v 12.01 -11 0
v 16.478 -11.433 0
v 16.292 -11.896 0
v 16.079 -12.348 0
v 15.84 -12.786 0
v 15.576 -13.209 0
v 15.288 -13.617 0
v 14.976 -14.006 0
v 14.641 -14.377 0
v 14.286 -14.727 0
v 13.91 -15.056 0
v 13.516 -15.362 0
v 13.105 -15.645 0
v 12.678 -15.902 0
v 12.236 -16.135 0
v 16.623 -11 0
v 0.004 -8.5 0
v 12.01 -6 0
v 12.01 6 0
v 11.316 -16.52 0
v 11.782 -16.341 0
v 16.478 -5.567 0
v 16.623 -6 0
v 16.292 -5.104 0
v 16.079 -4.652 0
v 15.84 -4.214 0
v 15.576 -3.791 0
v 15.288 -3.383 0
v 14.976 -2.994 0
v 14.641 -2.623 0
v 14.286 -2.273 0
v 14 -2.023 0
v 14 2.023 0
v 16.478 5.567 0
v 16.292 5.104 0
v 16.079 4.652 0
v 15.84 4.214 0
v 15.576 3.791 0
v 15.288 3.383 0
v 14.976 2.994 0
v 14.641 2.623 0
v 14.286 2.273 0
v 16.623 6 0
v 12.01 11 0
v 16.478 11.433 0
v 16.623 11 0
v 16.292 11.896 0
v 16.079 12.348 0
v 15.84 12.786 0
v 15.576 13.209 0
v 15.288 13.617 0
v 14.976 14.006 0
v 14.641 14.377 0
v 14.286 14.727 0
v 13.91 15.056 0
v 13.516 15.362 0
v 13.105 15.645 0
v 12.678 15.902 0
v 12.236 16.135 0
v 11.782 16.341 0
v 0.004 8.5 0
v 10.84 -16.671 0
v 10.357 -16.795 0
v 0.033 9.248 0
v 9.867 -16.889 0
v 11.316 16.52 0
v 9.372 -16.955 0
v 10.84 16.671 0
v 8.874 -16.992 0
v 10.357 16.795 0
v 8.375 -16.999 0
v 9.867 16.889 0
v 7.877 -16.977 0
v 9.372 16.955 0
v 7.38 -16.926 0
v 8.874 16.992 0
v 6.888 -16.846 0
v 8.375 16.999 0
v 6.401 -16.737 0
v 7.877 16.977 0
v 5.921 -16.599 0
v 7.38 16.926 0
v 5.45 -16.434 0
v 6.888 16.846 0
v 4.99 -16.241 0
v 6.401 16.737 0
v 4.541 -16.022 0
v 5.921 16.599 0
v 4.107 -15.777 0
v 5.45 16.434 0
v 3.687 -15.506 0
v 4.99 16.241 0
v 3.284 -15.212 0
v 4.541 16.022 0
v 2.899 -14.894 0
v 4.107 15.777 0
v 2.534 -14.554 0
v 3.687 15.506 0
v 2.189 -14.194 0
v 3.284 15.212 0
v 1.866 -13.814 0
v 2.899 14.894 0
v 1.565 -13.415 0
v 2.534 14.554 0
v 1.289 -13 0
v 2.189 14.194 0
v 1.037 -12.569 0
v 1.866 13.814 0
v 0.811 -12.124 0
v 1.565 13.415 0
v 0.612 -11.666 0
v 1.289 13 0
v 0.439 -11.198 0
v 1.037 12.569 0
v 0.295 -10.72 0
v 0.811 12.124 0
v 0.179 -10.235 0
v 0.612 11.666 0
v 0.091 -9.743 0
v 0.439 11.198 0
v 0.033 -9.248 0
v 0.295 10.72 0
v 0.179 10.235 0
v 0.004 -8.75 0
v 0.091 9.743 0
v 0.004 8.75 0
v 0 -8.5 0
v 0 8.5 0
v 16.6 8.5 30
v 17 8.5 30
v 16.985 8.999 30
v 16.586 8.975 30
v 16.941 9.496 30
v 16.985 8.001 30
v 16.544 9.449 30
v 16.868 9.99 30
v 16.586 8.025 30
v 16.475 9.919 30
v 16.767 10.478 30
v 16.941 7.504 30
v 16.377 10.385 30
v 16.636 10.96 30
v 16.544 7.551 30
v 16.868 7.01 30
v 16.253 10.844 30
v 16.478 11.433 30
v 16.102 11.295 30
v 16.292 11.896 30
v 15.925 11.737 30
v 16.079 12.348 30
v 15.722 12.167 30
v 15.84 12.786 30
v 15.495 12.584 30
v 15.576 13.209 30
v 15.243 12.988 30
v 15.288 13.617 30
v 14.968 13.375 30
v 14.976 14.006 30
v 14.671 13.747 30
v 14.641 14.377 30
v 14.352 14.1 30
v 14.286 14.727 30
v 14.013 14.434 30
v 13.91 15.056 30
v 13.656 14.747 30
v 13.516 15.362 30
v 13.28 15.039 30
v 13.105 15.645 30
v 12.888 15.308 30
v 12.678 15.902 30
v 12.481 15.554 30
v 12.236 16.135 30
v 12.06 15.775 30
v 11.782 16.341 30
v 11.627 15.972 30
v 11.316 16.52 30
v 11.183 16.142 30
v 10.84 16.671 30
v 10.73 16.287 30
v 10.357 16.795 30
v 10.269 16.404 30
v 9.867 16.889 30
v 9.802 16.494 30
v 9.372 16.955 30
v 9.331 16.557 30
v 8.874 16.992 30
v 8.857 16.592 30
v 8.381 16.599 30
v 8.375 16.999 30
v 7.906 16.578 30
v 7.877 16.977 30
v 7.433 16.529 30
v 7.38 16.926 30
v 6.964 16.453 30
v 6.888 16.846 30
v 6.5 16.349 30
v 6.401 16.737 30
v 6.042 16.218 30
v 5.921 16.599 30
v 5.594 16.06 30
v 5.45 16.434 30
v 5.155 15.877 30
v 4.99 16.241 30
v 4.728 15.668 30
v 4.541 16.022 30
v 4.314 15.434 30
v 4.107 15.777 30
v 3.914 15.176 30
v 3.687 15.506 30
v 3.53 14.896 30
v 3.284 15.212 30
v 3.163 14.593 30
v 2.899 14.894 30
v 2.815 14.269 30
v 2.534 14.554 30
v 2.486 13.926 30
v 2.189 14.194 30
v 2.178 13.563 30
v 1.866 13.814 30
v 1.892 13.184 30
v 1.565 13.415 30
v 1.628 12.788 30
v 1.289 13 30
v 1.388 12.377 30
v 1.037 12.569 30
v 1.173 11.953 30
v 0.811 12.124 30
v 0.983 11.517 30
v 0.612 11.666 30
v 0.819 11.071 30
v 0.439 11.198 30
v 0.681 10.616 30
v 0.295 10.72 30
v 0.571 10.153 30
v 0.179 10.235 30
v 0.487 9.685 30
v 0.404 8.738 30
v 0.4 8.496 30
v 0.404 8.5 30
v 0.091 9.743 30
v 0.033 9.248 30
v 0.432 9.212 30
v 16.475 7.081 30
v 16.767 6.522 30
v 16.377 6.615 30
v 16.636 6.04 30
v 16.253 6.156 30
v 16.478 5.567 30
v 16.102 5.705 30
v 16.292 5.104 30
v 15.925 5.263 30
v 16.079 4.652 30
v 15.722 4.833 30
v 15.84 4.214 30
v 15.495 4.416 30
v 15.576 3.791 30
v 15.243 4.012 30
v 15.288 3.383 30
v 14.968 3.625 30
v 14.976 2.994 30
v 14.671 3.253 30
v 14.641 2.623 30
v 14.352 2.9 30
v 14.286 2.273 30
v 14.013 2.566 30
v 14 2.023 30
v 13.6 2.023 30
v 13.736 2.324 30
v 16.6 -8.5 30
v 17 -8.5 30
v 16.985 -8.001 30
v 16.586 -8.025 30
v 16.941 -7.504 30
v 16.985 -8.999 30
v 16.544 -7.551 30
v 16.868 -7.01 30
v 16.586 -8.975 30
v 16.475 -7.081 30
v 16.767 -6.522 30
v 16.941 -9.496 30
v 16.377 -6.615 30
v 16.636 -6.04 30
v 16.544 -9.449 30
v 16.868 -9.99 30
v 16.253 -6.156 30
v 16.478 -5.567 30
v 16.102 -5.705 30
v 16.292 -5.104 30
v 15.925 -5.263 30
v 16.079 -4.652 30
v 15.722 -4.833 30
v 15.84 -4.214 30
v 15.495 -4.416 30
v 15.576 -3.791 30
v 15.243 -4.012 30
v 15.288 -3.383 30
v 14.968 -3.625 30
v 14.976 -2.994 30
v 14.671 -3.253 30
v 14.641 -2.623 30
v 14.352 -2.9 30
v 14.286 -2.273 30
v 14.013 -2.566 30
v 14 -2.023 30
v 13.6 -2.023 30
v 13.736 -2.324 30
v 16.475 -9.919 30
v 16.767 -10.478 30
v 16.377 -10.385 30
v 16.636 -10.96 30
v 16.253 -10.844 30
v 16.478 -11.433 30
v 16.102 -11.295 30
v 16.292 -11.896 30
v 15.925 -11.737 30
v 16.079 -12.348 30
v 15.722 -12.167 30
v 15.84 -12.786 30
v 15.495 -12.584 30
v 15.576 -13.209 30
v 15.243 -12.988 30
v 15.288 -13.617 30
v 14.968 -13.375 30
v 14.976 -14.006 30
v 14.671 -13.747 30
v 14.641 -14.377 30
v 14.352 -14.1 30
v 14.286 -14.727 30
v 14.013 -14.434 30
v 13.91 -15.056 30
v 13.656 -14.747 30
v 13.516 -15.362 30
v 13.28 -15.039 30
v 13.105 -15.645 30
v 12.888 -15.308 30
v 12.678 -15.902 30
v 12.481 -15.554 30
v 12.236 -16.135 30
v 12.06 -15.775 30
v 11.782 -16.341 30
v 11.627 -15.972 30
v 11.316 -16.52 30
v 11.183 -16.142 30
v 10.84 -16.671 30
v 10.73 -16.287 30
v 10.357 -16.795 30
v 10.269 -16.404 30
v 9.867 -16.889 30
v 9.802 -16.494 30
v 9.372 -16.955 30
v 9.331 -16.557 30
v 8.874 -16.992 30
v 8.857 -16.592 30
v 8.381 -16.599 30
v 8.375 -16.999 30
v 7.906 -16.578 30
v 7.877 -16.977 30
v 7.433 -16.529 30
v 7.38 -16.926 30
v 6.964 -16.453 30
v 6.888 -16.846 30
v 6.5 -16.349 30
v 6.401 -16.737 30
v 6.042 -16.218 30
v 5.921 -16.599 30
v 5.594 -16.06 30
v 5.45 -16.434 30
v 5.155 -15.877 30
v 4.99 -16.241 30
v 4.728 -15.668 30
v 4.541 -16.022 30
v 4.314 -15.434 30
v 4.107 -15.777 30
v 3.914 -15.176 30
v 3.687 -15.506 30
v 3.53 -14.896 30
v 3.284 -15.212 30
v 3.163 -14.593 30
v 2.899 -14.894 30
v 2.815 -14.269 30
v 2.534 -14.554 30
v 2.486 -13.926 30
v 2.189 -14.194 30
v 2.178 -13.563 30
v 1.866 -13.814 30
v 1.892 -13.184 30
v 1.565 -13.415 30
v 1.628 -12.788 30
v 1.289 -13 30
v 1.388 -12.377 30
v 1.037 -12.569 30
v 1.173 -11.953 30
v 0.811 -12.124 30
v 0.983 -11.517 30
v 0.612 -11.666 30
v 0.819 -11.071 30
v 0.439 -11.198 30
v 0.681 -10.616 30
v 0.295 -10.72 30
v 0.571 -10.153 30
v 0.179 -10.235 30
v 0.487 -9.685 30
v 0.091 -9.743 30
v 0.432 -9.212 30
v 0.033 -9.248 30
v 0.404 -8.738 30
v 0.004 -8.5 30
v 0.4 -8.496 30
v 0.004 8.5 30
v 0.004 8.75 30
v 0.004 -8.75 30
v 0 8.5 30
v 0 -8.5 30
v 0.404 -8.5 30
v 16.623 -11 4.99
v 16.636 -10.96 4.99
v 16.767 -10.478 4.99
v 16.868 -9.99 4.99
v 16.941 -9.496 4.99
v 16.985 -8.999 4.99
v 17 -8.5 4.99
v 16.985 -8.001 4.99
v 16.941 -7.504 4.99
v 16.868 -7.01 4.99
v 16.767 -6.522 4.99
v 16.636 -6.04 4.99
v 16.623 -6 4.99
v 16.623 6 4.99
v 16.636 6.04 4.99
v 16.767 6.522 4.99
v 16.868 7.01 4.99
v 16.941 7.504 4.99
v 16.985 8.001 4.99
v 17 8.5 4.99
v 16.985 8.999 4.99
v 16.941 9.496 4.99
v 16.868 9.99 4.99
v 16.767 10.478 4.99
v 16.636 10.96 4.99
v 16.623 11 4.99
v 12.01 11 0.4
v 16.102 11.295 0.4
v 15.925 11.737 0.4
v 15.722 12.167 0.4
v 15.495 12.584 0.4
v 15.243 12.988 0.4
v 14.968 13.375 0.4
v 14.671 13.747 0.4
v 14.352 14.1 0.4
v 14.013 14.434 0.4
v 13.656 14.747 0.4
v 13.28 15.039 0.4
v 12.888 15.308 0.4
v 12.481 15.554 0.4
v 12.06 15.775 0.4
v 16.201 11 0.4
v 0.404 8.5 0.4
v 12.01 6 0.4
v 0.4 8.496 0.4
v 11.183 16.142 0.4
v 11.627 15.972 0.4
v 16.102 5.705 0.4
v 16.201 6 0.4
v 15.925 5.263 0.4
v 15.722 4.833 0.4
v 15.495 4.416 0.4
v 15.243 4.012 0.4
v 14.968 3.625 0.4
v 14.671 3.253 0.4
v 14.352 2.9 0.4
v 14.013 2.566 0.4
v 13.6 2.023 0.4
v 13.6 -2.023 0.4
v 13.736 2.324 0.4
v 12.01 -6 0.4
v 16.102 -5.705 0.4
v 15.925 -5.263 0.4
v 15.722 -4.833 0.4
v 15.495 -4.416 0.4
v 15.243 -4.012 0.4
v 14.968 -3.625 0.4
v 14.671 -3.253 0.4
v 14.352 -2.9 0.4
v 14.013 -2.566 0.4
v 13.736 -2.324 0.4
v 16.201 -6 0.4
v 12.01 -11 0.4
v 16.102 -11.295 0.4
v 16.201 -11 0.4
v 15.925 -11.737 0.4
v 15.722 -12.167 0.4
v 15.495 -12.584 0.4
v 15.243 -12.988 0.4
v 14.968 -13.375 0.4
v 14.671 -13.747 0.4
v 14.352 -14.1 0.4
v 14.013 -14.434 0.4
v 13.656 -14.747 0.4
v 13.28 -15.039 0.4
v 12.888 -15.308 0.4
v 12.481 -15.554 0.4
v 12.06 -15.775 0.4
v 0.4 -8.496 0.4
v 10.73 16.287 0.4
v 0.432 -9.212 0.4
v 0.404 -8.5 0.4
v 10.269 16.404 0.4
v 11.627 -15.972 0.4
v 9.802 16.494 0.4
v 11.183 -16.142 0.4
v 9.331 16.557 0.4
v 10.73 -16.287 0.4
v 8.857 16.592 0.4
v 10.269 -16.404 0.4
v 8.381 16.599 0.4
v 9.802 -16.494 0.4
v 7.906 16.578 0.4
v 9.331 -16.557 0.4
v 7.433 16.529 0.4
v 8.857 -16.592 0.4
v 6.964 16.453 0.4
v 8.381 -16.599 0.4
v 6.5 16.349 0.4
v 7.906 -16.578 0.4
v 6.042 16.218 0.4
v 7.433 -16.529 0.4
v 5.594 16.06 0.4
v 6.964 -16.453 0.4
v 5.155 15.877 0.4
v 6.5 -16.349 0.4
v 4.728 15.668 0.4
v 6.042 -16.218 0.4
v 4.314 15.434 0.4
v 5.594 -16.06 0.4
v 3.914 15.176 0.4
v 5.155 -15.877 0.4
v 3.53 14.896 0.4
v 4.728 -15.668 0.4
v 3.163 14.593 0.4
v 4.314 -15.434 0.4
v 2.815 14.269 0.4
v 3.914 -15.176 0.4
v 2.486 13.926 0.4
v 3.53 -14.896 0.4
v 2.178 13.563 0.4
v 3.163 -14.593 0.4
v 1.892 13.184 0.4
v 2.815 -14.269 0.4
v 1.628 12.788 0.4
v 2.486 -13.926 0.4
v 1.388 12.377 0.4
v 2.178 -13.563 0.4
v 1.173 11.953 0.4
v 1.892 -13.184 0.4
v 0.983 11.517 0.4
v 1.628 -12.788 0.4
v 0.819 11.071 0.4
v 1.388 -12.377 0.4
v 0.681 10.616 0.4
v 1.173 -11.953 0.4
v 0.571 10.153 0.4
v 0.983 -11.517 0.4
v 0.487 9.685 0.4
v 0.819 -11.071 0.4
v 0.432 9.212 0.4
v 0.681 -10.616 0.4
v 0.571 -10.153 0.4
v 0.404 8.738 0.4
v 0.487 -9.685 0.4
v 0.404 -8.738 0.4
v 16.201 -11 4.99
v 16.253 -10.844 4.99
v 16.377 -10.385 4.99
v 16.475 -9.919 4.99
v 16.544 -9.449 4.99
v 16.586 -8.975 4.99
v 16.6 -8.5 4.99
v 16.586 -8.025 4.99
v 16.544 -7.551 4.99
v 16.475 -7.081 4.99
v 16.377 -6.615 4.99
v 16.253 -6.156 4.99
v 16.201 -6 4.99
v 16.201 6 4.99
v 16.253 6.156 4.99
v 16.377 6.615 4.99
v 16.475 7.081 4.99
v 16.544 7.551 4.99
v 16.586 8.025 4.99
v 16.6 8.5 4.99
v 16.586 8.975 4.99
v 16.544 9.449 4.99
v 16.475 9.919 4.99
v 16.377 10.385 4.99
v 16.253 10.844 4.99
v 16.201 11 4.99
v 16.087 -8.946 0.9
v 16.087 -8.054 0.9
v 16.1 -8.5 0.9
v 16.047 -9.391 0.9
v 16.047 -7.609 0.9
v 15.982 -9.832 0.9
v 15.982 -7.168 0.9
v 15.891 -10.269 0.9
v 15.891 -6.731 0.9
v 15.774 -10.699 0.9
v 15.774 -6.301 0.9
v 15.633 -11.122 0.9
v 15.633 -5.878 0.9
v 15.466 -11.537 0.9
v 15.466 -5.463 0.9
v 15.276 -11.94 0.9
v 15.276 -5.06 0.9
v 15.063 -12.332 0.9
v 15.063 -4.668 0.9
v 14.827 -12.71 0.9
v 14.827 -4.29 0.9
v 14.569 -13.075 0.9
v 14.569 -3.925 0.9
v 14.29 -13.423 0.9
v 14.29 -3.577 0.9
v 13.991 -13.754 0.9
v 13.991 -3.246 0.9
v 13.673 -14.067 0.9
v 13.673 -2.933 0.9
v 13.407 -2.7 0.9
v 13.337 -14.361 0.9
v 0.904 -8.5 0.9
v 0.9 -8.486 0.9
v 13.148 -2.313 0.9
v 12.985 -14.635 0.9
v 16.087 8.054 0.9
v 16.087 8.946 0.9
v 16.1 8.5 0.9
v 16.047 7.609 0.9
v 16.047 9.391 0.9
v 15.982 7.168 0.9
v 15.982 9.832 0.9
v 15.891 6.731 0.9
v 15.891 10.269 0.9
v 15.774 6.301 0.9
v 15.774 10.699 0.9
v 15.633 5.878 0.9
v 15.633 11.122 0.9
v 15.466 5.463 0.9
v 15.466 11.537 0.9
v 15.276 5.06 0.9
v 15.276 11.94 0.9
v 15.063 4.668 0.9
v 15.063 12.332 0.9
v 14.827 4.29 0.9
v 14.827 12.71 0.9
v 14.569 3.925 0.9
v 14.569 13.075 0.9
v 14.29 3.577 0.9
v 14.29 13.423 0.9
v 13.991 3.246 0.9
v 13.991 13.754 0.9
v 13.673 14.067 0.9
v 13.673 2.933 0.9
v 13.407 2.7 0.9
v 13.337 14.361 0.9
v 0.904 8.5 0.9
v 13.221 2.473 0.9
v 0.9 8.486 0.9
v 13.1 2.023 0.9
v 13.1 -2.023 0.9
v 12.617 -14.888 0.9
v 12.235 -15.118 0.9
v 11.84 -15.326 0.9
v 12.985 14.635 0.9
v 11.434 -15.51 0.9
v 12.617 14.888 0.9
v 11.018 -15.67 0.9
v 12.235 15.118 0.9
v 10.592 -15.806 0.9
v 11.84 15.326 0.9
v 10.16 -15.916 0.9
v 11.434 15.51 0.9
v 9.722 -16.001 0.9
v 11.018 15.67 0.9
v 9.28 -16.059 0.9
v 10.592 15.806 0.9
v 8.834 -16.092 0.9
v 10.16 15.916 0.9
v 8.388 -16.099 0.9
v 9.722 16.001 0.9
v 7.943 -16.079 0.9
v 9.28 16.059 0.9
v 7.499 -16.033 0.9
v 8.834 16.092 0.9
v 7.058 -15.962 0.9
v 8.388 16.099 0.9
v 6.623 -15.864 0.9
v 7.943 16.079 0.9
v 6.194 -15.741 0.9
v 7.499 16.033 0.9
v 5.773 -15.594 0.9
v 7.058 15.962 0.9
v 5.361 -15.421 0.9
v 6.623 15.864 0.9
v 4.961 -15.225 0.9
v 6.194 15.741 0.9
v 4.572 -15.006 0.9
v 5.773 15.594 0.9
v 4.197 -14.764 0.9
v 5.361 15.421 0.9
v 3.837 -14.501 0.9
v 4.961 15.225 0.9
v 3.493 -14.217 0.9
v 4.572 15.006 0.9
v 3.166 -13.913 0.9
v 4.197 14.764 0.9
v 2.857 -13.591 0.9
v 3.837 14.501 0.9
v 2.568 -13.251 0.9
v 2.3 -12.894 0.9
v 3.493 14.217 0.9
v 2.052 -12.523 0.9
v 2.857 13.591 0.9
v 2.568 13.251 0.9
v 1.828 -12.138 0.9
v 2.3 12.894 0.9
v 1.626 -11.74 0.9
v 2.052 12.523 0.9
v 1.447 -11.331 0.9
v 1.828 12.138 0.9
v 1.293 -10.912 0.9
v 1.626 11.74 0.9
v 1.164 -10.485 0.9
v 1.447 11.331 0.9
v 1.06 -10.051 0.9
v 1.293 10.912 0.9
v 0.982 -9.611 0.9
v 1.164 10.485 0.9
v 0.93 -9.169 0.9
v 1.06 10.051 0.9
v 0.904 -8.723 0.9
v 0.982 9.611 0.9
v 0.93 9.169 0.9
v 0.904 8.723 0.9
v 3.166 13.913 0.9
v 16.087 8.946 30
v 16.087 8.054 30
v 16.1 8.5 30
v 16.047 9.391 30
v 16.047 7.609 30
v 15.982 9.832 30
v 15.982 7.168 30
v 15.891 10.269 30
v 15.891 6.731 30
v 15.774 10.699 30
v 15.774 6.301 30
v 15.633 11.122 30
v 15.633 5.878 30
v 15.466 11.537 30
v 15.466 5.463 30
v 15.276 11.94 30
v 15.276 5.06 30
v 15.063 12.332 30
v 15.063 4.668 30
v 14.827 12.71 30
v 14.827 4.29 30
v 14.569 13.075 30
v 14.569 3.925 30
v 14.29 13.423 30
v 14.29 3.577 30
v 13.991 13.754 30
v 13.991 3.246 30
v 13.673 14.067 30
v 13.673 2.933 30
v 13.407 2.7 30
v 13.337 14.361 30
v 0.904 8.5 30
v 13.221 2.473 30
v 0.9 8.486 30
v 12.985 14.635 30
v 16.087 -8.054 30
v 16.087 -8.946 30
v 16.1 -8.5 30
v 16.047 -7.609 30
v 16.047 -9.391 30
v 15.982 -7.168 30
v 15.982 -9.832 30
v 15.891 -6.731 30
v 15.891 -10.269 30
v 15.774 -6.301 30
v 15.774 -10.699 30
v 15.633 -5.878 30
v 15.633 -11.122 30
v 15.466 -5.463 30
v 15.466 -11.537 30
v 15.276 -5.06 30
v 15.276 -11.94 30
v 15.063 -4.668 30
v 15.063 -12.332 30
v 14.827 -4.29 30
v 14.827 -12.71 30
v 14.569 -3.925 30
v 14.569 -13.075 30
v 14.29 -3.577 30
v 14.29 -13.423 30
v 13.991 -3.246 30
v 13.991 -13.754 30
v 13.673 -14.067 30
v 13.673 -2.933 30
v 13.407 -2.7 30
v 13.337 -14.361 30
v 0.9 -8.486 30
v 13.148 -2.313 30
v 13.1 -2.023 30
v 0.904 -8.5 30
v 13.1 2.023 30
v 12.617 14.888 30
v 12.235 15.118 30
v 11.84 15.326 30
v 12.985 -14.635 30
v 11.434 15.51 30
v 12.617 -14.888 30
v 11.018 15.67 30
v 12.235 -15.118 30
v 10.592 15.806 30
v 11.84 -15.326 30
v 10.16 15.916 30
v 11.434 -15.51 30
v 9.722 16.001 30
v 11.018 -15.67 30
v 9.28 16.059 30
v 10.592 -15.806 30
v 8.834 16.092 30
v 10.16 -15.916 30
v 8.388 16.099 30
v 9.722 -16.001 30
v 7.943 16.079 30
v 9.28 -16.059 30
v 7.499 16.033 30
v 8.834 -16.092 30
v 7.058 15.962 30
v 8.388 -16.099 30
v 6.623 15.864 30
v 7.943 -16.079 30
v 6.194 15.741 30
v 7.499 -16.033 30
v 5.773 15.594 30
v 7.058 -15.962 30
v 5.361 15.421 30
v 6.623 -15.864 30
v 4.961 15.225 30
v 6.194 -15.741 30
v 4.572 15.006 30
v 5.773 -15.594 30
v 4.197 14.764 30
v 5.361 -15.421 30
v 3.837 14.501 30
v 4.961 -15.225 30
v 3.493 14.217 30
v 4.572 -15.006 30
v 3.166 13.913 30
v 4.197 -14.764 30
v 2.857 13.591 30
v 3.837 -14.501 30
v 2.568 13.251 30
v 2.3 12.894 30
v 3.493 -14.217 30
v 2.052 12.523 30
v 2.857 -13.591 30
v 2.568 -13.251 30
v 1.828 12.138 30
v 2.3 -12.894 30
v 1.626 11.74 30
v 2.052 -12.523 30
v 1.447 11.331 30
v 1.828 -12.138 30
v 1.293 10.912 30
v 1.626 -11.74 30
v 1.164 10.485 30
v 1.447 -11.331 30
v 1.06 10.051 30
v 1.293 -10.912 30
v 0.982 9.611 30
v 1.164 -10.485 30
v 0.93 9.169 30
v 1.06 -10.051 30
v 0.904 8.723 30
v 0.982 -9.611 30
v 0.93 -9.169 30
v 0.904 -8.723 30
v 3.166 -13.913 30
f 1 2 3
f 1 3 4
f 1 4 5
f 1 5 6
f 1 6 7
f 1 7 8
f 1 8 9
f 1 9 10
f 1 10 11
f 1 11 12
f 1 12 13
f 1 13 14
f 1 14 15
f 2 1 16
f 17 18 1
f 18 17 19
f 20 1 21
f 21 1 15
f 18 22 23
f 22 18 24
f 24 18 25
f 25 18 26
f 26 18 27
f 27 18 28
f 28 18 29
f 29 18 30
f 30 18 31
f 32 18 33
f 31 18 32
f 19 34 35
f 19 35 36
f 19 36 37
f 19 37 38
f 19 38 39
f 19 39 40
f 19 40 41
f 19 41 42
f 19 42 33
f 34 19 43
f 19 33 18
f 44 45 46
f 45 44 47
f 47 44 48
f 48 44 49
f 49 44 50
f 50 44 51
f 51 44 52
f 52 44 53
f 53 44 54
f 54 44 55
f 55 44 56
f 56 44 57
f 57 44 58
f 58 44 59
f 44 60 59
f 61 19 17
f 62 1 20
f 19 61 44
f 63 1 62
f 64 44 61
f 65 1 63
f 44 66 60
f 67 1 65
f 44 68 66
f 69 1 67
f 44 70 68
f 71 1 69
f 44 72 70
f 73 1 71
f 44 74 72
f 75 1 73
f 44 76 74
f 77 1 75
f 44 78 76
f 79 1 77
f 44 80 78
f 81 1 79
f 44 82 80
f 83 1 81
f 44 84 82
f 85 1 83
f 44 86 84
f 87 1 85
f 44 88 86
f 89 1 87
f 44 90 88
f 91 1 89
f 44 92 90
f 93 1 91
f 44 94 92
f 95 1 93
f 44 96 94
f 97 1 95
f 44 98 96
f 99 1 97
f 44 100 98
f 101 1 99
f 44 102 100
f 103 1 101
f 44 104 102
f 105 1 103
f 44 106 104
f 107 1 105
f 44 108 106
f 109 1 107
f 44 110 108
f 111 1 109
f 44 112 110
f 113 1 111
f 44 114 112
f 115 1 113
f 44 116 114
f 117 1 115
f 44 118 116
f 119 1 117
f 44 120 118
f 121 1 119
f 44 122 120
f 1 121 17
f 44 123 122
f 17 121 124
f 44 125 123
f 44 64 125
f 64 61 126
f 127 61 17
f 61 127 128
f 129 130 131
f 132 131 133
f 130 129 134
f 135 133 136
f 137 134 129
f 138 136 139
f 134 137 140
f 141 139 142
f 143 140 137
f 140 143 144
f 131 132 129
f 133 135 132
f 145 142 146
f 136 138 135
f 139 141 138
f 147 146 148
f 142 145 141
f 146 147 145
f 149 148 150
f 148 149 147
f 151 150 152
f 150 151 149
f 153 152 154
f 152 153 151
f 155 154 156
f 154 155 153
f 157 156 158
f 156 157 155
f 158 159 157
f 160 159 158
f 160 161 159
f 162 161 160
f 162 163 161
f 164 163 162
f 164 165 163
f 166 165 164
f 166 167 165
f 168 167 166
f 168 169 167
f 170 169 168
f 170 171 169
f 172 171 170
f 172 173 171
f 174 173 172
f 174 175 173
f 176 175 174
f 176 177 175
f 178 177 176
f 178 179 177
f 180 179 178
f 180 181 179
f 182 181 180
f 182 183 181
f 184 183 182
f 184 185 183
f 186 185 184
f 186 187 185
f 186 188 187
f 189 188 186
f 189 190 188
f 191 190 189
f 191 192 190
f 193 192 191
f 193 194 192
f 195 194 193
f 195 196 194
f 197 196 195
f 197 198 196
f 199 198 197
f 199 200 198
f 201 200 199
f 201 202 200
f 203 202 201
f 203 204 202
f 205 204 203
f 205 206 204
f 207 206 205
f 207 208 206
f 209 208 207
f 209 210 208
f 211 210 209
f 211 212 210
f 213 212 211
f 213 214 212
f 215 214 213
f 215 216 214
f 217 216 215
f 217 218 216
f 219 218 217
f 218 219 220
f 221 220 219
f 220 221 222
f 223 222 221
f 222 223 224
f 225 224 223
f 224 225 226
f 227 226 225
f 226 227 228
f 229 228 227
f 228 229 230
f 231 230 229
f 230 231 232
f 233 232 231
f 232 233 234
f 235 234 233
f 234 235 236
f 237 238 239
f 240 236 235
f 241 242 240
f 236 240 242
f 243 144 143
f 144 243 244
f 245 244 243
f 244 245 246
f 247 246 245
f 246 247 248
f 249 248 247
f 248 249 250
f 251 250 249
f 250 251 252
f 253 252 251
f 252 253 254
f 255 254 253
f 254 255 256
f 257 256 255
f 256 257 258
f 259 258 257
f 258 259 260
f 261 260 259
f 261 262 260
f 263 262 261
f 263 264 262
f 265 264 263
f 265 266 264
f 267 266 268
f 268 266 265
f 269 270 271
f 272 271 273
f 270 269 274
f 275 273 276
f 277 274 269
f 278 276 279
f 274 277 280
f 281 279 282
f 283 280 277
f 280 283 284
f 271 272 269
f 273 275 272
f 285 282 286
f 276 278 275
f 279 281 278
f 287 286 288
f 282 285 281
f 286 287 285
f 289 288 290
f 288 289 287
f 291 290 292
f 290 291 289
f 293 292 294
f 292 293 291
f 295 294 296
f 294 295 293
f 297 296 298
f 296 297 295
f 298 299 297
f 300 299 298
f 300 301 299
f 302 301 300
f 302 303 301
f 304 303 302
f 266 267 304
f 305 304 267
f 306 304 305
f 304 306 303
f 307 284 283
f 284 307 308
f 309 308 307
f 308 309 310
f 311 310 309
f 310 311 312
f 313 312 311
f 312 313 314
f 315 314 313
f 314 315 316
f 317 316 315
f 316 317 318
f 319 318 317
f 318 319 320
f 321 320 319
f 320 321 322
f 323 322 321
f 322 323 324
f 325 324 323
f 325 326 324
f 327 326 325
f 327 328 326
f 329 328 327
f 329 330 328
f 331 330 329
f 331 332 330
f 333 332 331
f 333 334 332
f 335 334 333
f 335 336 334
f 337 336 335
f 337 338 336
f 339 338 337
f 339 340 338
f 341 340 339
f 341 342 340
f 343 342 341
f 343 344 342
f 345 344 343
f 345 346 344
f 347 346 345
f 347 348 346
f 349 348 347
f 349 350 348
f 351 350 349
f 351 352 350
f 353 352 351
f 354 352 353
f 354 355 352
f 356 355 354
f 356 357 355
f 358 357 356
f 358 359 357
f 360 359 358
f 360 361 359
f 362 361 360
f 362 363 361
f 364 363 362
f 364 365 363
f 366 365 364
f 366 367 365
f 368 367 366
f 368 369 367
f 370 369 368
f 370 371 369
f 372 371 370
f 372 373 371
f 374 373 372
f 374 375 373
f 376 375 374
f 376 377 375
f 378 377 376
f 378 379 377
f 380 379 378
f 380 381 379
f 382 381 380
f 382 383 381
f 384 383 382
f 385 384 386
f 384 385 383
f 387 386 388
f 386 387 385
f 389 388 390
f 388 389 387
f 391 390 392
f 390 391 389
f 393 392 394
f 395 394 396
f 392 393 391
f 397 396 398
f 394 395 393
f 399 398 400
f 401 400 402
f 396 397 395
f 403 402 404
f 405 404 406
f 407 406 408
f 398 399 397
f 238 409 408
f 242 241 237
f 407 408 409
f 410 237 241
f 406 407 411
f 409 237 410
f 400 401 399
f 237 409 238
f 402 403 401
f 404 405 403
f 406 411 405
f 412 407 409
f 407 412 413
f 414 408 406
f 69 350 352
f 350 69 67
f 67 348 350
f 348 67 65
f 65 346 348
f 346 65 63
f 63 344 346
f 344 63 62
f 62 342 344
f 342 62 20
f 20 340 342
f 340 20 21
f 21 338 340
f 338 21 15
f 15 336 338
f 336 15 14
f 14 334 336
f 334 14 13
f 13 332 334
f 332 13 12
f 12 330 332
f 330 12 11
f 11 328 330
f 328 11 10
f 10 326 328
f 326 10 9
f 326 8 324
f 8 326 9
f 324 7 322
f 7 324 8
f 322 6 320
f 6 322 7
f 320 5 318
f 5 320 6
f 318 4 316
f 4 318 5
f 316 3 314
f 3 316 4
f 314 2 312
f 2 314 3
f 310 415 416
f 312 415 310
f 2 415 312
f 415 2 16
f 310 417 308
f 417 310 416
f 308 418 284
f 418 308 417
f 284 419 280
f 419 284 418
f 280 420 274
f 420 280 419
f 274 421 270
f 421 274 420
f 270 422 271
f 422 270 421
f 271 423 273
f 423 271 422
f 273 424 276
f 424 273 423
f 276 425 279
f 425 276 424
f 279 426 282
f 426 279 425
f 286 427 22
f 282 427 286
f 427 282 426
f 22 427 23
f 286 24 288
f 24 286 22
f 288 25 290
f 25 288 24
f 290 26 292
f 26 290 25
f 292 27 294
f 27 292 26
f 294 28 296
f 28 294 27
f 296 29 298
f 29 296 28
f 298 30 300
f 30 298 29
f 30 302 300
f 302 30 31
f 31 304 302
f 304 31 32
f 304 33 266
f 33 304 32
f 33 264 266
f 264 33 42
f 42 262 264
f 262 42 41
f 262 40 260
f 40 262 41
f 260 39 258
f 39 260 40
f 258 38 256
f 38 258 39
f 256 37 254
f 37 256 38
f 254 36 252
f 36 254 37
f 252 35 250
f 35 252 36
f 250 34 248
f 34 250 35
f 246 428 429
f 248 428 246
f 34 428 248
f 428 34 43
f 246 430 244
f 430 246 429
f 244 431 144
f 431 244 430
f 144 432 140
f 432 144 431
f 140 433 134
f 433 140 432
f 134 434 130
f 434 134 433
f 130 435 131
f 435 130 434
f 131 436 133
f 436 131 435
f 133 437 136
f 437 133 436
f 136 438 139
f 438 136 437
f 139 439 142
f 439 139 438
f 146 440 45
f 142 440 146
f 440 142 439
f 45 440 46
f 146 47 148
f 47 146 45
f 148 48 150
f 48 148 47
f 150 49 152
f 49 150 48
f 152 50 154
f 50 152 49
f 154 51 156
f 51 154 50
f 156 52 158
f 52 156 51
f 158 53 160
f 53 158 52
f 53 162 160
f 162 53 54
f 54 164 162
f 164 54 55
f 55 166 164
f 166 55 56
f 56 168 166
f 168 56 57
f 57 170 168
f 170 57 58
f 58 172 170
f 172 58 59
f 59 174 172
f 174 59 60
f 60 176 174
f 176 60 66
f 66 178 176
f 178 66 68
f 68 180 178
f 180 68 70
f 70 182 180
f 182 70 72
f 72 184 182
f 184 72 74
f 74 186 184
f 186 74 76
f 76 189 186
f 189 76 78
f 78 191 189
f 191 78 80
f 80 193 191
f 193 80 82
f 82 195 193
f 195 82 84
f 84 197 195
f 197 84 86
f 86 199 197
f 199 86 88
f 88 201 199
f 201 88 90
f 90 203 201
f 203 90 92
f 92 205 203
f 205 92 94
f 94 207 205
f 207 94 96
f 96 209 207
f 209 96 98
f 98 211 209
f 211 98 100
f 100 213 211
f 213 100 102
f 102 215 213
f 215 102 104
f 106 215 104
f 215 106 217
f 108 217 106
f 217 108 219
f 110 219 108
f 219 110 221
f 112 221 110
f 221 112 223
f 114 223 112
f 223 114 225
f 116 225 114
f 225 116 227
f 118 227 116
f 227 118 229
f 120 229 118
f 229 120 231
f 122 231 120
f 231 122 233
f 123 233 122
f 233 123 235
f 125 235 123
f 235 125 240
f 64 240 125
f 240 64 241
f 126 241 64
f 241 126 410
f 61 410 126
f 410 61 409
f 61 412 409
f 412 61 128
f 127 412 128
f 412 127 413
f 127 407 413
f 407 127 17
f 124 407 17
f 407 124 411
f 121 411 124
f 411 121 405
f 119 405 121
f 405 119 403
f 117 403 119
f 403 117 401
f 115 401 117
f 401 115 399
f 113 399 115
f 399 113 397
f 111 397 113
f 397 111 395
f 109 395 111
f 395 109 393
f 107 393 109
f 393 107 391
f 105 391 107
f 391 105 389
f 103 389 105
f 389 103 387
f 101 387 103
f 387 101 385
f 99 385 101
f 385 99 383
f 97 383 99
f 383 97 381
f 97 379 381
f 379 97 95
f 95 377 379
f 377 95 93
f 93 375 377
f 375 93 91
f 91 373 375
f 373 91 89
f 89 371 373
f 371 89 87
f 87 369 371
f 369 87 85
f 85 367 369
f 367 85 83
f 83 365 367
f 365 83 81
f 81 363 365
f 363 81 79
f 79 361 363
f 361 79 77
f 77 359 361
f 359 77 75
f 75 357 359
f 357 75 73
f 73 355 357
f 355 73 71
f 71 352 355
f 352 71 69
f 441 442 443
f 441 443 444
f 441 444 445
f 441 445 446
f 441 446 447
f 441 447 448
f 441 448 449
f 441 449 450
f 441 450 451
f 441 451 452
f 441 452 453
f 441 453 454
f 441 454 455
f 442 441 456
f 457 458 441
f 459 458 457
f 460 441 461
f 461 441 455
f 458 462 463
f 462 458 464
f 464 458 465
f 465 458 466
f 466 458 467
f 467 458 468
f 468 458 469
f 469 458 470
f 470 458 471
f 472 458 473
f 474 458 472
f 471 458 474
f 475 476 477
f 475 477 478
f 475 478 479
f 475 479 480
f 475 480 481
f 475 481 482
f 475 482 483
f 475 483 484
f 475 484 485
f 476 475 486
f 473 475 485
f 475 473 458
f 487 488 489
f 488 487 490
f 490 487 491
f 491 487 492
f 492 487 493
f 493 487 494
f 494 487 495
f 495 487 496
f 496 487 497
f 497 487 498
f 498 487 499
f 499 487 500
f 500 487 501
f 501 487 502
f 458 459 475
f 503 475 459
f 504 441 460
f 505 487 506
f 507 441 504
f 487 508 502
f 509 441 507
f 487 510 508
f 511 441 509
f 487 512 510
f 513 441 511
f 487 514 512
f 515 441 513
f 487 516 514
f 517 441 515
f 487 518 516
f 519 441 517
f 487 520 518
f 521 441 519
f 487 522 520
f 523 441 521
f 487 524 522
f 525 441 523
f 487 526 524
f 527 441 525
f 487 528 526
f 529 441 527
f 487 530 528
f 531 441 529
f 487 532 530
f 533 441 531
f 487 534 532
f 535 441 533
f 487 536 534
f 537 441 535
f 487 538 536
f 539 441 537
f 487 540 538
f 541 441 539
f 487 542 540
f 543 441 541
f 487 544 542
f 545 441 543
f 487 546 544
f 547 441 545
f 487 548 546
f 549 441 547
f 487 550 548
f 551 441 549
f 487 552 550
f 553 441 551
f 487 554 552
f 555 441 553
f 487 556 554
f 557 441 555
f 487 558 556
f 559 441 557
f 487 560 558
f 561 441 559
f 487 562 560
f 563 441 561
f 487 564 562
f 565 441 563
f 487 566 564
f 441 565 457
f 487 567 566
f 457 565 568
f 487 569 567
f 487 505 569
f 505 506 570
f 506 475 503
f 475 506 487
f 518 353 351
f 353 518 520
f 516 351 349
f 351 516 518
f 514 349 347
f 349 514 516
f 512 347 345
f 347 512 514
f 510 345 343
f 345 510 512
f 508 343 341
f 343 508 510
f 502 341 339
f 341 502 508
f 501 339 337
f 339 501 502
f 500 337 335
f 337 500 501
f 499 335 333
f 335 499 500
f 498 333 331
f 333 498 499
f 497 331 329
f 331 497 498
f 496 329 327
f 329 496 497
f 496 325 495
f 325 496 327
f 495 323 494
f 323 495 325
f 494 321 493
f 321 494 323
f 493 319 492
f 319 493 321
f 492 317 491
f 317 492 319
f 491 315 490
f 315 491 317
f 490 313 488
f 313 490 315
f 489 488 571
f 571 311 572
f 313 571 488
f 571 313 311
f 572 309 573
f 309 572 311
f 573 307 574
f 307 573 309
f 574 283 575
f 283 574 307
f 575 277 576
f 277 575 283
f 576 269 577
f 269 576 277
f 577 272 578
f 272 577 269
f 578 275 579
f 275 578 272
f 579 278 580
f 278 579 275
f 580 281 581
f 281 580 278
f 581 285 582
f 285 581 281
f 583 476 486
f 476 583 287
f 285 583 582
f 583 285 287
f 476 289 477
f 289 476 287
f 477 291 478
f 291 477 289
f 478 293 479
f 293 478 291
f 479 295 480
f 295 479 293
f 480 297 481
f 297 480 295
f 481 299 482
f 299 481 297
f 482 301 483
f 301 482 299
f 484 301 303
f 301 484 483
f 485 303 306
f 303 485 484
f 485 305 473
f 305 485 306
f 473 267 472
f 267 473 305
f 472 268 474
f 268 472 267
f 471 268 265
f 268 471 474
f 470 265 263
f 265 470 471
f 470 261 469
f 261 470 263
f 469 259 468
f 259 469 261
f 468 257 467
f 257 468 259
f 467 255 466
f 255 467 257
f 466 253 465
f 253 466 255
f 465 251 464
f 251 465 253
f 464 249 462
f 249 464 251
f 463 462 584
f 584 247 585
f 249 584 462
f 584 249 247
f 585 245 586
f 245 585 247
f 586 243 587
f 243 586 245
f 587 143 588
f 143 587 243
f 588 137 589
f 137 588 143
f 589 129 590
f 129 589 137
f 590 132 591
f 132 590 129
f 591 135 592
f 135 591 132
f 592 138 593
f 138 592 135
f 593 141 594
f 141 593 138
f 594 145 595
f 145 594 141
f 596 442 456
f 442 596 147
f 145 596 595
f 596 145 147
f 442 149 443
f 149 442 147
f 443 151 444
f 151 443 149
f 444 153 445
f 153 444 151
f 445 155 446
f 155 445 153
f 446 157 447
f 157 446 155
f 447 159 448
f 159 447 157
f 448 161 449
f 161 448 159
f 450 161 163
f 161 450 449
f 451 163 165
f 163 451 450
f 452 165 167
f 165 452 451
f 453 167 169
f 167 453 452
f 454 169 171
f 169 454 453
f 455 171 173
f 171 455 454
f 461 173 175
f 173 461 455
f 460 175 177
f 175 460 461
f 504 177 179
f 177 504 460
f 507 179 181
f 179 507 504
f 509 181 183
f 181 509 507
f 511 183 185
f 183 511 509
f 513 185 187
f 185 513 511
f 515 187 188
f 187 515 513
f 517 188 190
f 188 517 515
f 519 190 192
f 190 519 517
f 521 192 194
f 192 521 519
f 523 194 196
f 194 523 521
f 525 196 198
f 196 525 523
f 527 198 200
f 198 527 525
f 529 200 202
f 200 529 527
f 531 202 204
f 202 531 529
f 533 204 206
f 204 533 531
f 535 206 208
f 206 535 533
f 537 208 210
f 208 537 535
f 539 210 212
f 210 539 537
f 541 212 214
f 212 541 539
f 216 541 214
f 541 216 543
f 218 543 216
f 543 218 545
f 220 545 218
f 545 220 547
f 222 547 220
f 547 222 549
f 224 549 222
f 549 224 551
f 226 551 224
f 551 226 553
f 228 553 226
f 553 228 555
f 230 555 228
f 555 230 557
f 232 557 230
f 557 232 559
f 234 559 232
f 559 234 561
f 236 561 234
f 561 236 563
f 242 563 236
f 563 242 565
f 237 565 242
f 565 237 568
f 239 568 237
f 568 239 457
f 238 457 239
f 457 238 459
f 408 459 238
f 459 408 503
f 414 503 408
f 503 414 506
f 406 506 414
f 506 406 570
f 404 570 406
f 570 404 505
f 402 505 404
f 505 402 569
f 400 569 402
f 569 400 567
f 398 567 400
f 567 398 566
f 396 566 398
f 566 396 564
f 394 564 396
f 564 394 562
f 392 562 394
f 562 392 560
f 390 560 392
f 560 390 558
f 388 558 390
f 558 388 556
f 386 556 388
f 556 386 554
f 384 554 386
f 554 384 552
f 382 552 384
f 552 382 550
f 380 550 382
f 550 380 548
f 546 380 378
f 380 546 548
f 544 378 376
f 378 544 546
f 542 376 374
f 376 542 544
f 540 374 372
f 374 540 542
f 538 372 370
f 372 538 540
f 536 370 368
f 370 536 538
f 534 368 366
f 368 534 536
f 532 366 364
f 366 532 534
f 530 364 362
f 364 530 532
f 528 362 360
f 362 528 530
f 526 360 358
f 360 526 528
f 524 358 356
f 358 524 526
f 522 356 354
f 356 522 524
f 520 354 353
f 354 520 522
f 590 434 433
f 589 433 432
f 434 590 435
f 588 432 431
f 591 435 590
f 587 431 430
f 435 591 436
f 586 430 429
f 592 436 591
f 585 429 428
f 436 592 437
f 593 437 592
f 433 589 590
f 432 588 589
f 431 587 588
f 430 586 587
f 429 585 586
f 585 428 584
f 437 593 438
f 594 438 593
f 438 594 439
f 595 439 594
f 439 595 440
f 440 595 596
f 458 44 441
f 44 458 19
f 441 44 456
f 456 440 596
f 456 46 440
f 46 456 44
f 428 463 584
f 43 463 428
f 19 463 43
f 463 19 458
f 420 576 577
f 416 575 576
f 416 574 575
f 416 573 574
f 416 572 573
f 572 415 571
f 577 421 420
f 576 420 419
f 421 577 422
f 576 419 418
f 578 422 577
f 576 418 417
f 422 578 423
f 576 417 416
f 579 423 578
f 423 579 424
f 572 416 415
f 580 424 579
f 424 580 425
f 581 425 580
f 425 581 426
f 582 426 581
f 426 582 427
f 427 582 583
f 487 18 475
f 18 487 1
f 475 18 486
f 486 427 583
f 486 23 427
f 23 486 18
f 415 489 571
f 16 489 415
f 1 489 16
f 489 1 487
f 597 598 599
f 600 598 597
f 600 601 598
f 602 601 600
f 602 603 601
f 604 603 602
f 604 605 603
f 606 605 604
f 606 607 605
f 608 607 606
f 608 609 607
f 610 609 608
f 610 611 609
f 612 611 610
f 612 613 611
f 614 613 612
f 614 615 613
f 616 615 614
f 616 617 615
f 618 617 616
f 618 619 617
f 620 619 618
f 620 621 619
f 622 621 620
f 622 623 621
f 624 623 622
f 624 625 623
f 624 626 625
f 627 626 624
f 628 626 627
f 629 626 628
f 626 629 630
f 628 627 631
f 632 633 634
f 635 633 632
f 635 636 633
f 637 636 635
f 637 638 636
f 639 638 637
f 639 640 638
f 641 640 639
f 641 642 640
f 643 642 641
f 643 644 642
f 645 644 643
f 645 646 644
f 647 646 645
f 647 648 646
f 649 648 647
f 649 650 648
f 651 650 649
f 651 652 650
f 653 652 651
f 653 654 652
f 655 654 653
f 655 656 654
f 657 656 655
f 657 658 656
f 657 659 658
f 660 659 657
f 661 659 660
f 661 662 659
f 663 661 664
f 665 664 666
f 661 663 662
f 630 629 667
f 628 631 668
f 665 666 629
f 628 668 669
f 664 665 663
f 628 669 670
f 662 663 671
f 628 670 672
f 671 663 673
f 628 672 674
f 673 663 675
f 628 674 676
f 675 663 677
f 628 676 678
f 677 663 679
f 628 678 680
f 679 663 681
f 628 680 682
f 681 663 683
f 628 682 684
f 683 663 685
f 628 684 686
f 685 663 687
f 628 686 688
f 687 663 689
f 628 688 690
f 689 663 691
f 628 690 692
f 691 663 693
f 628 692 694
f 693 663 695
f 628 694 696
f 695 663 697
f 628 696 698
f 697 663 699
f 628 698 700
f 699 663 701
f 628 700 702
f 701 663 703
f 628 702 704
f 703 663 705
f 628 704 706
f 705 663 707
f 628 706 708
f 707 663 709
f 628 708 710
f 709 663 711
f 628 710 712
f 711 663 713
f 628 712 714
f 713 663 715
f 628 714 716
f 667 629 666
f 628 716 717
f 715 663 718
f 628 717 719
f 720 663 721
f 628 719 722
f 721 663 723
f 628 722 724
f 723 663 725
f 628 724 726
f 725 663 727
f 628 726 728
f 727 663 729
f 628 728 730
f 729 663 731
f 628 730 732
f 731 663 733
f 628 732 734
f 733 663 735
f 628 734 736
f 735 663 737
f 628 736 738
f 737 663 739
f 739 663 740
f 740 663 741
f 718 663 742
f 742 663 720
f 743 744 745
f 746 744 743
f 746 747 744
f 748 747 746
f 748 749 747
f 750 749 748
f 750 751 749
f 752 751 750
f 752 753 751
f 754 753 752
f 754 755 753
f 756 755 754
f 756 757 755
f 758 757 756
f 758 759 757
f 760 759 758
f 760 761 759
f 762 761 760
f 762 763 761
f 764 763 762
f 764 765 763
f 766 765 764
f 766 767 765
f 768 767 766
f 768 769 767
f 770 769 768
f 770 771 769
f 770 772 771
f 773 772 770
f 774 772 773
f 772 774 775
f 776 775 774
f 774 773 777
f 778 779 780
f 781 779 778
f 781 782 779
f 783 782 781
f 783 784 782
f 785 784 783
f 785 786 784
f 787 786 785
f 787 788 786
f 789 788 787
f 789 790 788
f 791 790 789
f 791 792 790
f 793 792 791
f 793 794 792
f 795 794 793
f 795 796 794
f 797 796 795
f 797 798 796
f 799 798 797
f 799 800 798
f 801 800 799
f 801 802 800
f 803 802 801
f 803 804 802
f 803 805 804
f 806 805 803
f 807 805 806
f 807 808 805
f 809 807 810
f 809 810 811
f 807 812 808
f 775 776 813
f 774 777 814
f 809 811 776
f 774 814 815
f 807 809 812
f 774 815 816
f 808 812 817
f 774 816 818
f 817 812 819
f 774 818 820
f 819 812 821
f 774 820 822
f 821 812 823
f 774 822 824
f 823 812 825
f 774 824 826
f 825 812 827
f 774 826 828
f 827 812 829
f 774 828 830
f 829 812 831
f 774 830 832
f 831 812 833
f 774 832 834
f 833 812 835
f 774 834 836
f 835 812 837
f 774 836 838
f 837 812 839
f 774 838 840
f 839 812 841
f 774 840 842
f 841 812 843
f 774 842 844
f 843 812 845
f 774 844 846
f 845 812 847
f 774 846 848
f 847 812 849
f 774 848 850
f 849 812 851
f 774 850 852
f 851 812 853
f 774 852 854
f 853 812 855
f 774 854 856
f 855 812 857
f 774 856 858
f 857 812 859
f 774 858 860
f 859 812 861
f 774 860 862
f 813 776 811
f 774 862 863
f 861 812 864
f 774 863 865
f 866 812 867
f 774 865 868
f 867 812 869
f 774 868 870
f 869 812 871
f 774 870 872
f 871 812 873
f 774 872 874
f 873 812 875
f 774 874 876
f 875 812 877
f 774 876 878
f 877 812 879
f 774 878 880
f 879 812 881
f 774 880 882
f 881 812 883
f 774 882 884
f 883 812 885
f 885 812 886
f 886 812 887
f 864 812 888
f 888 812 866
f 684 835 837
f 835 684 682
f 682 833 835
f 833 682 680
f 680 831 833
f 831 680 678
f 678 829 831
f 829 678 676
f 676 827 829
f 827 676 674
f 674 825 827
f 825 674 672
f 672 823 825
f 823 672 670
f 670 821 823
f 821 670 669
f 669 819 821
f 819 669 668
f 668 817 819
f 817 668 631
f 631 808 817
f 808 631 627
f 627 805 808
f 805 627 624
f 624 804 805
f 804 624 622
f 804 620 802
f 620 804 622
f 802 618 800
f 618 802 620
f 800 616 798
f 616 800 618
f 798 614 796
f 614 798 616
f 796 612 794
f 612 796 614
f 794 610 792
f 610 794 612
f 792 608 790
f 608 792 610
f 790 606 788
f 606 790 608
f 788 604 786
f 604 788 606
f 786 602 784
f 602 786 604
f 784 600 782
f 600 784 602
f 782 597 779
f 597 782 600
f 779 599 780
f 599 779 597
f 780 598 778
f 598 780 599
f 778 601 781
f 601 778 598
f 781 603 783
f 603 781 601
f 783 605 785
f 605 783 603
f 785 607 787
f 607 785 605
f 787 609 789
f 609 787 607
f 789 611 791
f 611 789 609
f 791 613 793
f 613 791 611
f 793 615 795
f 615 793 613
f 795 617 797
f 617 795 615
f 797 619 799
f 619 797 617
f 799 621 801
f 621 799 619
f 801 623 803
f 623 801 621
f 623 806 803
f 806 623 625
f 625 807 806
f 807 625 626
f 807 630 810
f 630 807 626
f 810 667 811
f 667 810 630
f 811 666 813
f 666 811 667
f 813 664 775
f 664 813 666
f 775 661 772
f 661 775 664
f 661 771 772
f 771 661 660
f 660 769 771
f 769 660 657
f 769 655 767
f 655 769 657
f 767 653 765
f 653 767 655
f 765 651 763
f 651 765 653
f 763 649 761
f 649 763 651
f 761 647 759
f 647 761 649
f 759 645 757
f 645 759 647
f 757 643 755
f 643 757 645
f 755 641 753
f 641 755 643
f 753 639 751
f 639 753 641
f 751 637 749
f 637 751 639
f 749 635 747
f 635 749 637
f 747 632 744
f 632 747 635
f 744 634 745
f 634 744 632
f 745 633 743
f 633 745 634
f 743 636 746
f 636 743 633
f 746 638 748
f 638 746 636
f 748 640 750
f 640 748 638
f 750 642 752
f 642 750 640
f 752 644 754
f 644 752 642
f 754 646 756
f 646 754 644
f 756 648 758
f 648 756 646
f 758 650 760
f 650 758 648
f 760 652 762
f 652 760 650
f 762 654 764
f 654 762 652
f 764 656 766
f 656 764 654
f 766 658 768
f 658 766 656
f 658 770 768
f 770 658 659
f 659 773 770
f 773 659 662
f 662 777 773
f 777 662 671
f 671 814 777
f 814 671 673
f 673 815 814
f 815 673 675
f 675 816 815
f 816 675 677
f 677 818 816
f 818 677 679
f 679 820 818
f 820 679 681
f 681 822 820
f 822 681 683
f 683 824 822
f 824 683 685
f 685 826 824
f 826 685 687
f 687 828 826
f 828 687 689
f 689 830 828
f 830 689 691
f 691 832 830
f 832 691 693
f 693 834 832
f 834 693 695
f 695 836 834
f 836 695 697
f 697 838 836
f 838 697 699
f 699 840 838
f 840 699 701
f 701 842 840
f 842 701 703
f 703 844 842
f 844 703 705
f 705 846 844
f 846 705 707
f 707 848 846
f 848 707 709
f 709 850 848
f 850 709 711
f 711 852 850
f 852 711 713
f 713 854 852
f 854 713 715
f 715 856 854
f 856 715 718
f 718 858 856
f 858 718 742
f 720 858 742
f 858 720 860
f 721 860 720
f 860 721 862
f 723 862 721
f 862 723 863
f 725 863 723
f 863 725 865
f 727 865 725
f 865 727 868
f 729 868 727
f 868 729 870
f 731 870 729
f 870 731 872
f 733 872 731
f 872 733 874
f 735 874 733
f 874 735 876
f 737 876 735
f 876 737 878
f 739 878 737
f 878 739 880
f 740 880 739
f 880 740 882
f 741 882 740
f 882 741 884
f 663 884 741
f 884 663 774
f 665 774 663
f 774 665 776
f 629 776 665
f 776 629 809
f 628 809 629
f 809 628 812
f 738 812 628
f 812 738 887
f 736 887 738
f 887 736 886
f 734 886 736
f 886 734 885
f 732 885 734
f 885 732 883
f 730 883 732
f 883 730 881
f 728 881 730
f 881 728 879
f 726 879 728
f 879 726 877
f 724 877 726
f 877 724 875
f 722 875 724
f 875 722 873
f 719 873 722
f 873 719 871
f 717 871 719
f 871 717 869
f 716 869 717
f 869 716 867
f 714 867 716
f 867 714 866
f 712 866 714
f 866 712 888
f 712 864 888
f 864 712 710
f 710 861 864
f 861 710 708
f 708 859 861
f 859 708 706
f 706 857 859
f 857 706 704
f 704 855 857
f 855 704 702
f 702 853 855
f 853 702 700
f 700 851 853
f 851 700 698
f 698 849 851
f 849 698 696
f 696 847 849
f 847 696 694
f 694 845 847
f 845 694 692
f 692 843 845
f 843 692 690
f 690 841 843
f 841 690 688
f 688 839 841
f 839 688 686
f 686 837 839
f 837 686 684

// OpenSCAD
$fa=1/1;
$fs=1/2;
bissl=1/100;
d123=17;
neck=14;
wall=0.4;
air=0.5;
height=30;
contact=5;
module crosssection(d123,neck) {
  translate([d123/2,d123/2])circle(d=d123);
  translate([d123/2,-d123/2])circle(d=d123);
  translate([0,-d123/2])square([neck,d123]);
}
//crosssection(d123,neck);
module case(d123=d123,neck=neck,wall=wall,height=height,contact=contact){
  difference(){
    linear_extrude(height=height,convexity=4 ) crosssection(d123,neck);
    translate([0,0,wall])linear_extrude(height=height,convexity=4 ) offset(r=-wall) crosssection(d123,neck);
    translate([d123-contact+bissl,d123/2-contact/2,-bissl])cube([contact,contact,contact]);
    translate([d123-contact+bissl,-d123/2-contact/2,-bissl])cube([contact,contact,contact]);
  }
}
module insert(d123=d123,neck=neck,wall=wall,height=height,contact=contact,air=air) {
  translate([0,0,wall+air])linear_extrude(height=height-wall-air) offset(r=-wall-air) crosssection(d123,neck);
}
case();
insert();
